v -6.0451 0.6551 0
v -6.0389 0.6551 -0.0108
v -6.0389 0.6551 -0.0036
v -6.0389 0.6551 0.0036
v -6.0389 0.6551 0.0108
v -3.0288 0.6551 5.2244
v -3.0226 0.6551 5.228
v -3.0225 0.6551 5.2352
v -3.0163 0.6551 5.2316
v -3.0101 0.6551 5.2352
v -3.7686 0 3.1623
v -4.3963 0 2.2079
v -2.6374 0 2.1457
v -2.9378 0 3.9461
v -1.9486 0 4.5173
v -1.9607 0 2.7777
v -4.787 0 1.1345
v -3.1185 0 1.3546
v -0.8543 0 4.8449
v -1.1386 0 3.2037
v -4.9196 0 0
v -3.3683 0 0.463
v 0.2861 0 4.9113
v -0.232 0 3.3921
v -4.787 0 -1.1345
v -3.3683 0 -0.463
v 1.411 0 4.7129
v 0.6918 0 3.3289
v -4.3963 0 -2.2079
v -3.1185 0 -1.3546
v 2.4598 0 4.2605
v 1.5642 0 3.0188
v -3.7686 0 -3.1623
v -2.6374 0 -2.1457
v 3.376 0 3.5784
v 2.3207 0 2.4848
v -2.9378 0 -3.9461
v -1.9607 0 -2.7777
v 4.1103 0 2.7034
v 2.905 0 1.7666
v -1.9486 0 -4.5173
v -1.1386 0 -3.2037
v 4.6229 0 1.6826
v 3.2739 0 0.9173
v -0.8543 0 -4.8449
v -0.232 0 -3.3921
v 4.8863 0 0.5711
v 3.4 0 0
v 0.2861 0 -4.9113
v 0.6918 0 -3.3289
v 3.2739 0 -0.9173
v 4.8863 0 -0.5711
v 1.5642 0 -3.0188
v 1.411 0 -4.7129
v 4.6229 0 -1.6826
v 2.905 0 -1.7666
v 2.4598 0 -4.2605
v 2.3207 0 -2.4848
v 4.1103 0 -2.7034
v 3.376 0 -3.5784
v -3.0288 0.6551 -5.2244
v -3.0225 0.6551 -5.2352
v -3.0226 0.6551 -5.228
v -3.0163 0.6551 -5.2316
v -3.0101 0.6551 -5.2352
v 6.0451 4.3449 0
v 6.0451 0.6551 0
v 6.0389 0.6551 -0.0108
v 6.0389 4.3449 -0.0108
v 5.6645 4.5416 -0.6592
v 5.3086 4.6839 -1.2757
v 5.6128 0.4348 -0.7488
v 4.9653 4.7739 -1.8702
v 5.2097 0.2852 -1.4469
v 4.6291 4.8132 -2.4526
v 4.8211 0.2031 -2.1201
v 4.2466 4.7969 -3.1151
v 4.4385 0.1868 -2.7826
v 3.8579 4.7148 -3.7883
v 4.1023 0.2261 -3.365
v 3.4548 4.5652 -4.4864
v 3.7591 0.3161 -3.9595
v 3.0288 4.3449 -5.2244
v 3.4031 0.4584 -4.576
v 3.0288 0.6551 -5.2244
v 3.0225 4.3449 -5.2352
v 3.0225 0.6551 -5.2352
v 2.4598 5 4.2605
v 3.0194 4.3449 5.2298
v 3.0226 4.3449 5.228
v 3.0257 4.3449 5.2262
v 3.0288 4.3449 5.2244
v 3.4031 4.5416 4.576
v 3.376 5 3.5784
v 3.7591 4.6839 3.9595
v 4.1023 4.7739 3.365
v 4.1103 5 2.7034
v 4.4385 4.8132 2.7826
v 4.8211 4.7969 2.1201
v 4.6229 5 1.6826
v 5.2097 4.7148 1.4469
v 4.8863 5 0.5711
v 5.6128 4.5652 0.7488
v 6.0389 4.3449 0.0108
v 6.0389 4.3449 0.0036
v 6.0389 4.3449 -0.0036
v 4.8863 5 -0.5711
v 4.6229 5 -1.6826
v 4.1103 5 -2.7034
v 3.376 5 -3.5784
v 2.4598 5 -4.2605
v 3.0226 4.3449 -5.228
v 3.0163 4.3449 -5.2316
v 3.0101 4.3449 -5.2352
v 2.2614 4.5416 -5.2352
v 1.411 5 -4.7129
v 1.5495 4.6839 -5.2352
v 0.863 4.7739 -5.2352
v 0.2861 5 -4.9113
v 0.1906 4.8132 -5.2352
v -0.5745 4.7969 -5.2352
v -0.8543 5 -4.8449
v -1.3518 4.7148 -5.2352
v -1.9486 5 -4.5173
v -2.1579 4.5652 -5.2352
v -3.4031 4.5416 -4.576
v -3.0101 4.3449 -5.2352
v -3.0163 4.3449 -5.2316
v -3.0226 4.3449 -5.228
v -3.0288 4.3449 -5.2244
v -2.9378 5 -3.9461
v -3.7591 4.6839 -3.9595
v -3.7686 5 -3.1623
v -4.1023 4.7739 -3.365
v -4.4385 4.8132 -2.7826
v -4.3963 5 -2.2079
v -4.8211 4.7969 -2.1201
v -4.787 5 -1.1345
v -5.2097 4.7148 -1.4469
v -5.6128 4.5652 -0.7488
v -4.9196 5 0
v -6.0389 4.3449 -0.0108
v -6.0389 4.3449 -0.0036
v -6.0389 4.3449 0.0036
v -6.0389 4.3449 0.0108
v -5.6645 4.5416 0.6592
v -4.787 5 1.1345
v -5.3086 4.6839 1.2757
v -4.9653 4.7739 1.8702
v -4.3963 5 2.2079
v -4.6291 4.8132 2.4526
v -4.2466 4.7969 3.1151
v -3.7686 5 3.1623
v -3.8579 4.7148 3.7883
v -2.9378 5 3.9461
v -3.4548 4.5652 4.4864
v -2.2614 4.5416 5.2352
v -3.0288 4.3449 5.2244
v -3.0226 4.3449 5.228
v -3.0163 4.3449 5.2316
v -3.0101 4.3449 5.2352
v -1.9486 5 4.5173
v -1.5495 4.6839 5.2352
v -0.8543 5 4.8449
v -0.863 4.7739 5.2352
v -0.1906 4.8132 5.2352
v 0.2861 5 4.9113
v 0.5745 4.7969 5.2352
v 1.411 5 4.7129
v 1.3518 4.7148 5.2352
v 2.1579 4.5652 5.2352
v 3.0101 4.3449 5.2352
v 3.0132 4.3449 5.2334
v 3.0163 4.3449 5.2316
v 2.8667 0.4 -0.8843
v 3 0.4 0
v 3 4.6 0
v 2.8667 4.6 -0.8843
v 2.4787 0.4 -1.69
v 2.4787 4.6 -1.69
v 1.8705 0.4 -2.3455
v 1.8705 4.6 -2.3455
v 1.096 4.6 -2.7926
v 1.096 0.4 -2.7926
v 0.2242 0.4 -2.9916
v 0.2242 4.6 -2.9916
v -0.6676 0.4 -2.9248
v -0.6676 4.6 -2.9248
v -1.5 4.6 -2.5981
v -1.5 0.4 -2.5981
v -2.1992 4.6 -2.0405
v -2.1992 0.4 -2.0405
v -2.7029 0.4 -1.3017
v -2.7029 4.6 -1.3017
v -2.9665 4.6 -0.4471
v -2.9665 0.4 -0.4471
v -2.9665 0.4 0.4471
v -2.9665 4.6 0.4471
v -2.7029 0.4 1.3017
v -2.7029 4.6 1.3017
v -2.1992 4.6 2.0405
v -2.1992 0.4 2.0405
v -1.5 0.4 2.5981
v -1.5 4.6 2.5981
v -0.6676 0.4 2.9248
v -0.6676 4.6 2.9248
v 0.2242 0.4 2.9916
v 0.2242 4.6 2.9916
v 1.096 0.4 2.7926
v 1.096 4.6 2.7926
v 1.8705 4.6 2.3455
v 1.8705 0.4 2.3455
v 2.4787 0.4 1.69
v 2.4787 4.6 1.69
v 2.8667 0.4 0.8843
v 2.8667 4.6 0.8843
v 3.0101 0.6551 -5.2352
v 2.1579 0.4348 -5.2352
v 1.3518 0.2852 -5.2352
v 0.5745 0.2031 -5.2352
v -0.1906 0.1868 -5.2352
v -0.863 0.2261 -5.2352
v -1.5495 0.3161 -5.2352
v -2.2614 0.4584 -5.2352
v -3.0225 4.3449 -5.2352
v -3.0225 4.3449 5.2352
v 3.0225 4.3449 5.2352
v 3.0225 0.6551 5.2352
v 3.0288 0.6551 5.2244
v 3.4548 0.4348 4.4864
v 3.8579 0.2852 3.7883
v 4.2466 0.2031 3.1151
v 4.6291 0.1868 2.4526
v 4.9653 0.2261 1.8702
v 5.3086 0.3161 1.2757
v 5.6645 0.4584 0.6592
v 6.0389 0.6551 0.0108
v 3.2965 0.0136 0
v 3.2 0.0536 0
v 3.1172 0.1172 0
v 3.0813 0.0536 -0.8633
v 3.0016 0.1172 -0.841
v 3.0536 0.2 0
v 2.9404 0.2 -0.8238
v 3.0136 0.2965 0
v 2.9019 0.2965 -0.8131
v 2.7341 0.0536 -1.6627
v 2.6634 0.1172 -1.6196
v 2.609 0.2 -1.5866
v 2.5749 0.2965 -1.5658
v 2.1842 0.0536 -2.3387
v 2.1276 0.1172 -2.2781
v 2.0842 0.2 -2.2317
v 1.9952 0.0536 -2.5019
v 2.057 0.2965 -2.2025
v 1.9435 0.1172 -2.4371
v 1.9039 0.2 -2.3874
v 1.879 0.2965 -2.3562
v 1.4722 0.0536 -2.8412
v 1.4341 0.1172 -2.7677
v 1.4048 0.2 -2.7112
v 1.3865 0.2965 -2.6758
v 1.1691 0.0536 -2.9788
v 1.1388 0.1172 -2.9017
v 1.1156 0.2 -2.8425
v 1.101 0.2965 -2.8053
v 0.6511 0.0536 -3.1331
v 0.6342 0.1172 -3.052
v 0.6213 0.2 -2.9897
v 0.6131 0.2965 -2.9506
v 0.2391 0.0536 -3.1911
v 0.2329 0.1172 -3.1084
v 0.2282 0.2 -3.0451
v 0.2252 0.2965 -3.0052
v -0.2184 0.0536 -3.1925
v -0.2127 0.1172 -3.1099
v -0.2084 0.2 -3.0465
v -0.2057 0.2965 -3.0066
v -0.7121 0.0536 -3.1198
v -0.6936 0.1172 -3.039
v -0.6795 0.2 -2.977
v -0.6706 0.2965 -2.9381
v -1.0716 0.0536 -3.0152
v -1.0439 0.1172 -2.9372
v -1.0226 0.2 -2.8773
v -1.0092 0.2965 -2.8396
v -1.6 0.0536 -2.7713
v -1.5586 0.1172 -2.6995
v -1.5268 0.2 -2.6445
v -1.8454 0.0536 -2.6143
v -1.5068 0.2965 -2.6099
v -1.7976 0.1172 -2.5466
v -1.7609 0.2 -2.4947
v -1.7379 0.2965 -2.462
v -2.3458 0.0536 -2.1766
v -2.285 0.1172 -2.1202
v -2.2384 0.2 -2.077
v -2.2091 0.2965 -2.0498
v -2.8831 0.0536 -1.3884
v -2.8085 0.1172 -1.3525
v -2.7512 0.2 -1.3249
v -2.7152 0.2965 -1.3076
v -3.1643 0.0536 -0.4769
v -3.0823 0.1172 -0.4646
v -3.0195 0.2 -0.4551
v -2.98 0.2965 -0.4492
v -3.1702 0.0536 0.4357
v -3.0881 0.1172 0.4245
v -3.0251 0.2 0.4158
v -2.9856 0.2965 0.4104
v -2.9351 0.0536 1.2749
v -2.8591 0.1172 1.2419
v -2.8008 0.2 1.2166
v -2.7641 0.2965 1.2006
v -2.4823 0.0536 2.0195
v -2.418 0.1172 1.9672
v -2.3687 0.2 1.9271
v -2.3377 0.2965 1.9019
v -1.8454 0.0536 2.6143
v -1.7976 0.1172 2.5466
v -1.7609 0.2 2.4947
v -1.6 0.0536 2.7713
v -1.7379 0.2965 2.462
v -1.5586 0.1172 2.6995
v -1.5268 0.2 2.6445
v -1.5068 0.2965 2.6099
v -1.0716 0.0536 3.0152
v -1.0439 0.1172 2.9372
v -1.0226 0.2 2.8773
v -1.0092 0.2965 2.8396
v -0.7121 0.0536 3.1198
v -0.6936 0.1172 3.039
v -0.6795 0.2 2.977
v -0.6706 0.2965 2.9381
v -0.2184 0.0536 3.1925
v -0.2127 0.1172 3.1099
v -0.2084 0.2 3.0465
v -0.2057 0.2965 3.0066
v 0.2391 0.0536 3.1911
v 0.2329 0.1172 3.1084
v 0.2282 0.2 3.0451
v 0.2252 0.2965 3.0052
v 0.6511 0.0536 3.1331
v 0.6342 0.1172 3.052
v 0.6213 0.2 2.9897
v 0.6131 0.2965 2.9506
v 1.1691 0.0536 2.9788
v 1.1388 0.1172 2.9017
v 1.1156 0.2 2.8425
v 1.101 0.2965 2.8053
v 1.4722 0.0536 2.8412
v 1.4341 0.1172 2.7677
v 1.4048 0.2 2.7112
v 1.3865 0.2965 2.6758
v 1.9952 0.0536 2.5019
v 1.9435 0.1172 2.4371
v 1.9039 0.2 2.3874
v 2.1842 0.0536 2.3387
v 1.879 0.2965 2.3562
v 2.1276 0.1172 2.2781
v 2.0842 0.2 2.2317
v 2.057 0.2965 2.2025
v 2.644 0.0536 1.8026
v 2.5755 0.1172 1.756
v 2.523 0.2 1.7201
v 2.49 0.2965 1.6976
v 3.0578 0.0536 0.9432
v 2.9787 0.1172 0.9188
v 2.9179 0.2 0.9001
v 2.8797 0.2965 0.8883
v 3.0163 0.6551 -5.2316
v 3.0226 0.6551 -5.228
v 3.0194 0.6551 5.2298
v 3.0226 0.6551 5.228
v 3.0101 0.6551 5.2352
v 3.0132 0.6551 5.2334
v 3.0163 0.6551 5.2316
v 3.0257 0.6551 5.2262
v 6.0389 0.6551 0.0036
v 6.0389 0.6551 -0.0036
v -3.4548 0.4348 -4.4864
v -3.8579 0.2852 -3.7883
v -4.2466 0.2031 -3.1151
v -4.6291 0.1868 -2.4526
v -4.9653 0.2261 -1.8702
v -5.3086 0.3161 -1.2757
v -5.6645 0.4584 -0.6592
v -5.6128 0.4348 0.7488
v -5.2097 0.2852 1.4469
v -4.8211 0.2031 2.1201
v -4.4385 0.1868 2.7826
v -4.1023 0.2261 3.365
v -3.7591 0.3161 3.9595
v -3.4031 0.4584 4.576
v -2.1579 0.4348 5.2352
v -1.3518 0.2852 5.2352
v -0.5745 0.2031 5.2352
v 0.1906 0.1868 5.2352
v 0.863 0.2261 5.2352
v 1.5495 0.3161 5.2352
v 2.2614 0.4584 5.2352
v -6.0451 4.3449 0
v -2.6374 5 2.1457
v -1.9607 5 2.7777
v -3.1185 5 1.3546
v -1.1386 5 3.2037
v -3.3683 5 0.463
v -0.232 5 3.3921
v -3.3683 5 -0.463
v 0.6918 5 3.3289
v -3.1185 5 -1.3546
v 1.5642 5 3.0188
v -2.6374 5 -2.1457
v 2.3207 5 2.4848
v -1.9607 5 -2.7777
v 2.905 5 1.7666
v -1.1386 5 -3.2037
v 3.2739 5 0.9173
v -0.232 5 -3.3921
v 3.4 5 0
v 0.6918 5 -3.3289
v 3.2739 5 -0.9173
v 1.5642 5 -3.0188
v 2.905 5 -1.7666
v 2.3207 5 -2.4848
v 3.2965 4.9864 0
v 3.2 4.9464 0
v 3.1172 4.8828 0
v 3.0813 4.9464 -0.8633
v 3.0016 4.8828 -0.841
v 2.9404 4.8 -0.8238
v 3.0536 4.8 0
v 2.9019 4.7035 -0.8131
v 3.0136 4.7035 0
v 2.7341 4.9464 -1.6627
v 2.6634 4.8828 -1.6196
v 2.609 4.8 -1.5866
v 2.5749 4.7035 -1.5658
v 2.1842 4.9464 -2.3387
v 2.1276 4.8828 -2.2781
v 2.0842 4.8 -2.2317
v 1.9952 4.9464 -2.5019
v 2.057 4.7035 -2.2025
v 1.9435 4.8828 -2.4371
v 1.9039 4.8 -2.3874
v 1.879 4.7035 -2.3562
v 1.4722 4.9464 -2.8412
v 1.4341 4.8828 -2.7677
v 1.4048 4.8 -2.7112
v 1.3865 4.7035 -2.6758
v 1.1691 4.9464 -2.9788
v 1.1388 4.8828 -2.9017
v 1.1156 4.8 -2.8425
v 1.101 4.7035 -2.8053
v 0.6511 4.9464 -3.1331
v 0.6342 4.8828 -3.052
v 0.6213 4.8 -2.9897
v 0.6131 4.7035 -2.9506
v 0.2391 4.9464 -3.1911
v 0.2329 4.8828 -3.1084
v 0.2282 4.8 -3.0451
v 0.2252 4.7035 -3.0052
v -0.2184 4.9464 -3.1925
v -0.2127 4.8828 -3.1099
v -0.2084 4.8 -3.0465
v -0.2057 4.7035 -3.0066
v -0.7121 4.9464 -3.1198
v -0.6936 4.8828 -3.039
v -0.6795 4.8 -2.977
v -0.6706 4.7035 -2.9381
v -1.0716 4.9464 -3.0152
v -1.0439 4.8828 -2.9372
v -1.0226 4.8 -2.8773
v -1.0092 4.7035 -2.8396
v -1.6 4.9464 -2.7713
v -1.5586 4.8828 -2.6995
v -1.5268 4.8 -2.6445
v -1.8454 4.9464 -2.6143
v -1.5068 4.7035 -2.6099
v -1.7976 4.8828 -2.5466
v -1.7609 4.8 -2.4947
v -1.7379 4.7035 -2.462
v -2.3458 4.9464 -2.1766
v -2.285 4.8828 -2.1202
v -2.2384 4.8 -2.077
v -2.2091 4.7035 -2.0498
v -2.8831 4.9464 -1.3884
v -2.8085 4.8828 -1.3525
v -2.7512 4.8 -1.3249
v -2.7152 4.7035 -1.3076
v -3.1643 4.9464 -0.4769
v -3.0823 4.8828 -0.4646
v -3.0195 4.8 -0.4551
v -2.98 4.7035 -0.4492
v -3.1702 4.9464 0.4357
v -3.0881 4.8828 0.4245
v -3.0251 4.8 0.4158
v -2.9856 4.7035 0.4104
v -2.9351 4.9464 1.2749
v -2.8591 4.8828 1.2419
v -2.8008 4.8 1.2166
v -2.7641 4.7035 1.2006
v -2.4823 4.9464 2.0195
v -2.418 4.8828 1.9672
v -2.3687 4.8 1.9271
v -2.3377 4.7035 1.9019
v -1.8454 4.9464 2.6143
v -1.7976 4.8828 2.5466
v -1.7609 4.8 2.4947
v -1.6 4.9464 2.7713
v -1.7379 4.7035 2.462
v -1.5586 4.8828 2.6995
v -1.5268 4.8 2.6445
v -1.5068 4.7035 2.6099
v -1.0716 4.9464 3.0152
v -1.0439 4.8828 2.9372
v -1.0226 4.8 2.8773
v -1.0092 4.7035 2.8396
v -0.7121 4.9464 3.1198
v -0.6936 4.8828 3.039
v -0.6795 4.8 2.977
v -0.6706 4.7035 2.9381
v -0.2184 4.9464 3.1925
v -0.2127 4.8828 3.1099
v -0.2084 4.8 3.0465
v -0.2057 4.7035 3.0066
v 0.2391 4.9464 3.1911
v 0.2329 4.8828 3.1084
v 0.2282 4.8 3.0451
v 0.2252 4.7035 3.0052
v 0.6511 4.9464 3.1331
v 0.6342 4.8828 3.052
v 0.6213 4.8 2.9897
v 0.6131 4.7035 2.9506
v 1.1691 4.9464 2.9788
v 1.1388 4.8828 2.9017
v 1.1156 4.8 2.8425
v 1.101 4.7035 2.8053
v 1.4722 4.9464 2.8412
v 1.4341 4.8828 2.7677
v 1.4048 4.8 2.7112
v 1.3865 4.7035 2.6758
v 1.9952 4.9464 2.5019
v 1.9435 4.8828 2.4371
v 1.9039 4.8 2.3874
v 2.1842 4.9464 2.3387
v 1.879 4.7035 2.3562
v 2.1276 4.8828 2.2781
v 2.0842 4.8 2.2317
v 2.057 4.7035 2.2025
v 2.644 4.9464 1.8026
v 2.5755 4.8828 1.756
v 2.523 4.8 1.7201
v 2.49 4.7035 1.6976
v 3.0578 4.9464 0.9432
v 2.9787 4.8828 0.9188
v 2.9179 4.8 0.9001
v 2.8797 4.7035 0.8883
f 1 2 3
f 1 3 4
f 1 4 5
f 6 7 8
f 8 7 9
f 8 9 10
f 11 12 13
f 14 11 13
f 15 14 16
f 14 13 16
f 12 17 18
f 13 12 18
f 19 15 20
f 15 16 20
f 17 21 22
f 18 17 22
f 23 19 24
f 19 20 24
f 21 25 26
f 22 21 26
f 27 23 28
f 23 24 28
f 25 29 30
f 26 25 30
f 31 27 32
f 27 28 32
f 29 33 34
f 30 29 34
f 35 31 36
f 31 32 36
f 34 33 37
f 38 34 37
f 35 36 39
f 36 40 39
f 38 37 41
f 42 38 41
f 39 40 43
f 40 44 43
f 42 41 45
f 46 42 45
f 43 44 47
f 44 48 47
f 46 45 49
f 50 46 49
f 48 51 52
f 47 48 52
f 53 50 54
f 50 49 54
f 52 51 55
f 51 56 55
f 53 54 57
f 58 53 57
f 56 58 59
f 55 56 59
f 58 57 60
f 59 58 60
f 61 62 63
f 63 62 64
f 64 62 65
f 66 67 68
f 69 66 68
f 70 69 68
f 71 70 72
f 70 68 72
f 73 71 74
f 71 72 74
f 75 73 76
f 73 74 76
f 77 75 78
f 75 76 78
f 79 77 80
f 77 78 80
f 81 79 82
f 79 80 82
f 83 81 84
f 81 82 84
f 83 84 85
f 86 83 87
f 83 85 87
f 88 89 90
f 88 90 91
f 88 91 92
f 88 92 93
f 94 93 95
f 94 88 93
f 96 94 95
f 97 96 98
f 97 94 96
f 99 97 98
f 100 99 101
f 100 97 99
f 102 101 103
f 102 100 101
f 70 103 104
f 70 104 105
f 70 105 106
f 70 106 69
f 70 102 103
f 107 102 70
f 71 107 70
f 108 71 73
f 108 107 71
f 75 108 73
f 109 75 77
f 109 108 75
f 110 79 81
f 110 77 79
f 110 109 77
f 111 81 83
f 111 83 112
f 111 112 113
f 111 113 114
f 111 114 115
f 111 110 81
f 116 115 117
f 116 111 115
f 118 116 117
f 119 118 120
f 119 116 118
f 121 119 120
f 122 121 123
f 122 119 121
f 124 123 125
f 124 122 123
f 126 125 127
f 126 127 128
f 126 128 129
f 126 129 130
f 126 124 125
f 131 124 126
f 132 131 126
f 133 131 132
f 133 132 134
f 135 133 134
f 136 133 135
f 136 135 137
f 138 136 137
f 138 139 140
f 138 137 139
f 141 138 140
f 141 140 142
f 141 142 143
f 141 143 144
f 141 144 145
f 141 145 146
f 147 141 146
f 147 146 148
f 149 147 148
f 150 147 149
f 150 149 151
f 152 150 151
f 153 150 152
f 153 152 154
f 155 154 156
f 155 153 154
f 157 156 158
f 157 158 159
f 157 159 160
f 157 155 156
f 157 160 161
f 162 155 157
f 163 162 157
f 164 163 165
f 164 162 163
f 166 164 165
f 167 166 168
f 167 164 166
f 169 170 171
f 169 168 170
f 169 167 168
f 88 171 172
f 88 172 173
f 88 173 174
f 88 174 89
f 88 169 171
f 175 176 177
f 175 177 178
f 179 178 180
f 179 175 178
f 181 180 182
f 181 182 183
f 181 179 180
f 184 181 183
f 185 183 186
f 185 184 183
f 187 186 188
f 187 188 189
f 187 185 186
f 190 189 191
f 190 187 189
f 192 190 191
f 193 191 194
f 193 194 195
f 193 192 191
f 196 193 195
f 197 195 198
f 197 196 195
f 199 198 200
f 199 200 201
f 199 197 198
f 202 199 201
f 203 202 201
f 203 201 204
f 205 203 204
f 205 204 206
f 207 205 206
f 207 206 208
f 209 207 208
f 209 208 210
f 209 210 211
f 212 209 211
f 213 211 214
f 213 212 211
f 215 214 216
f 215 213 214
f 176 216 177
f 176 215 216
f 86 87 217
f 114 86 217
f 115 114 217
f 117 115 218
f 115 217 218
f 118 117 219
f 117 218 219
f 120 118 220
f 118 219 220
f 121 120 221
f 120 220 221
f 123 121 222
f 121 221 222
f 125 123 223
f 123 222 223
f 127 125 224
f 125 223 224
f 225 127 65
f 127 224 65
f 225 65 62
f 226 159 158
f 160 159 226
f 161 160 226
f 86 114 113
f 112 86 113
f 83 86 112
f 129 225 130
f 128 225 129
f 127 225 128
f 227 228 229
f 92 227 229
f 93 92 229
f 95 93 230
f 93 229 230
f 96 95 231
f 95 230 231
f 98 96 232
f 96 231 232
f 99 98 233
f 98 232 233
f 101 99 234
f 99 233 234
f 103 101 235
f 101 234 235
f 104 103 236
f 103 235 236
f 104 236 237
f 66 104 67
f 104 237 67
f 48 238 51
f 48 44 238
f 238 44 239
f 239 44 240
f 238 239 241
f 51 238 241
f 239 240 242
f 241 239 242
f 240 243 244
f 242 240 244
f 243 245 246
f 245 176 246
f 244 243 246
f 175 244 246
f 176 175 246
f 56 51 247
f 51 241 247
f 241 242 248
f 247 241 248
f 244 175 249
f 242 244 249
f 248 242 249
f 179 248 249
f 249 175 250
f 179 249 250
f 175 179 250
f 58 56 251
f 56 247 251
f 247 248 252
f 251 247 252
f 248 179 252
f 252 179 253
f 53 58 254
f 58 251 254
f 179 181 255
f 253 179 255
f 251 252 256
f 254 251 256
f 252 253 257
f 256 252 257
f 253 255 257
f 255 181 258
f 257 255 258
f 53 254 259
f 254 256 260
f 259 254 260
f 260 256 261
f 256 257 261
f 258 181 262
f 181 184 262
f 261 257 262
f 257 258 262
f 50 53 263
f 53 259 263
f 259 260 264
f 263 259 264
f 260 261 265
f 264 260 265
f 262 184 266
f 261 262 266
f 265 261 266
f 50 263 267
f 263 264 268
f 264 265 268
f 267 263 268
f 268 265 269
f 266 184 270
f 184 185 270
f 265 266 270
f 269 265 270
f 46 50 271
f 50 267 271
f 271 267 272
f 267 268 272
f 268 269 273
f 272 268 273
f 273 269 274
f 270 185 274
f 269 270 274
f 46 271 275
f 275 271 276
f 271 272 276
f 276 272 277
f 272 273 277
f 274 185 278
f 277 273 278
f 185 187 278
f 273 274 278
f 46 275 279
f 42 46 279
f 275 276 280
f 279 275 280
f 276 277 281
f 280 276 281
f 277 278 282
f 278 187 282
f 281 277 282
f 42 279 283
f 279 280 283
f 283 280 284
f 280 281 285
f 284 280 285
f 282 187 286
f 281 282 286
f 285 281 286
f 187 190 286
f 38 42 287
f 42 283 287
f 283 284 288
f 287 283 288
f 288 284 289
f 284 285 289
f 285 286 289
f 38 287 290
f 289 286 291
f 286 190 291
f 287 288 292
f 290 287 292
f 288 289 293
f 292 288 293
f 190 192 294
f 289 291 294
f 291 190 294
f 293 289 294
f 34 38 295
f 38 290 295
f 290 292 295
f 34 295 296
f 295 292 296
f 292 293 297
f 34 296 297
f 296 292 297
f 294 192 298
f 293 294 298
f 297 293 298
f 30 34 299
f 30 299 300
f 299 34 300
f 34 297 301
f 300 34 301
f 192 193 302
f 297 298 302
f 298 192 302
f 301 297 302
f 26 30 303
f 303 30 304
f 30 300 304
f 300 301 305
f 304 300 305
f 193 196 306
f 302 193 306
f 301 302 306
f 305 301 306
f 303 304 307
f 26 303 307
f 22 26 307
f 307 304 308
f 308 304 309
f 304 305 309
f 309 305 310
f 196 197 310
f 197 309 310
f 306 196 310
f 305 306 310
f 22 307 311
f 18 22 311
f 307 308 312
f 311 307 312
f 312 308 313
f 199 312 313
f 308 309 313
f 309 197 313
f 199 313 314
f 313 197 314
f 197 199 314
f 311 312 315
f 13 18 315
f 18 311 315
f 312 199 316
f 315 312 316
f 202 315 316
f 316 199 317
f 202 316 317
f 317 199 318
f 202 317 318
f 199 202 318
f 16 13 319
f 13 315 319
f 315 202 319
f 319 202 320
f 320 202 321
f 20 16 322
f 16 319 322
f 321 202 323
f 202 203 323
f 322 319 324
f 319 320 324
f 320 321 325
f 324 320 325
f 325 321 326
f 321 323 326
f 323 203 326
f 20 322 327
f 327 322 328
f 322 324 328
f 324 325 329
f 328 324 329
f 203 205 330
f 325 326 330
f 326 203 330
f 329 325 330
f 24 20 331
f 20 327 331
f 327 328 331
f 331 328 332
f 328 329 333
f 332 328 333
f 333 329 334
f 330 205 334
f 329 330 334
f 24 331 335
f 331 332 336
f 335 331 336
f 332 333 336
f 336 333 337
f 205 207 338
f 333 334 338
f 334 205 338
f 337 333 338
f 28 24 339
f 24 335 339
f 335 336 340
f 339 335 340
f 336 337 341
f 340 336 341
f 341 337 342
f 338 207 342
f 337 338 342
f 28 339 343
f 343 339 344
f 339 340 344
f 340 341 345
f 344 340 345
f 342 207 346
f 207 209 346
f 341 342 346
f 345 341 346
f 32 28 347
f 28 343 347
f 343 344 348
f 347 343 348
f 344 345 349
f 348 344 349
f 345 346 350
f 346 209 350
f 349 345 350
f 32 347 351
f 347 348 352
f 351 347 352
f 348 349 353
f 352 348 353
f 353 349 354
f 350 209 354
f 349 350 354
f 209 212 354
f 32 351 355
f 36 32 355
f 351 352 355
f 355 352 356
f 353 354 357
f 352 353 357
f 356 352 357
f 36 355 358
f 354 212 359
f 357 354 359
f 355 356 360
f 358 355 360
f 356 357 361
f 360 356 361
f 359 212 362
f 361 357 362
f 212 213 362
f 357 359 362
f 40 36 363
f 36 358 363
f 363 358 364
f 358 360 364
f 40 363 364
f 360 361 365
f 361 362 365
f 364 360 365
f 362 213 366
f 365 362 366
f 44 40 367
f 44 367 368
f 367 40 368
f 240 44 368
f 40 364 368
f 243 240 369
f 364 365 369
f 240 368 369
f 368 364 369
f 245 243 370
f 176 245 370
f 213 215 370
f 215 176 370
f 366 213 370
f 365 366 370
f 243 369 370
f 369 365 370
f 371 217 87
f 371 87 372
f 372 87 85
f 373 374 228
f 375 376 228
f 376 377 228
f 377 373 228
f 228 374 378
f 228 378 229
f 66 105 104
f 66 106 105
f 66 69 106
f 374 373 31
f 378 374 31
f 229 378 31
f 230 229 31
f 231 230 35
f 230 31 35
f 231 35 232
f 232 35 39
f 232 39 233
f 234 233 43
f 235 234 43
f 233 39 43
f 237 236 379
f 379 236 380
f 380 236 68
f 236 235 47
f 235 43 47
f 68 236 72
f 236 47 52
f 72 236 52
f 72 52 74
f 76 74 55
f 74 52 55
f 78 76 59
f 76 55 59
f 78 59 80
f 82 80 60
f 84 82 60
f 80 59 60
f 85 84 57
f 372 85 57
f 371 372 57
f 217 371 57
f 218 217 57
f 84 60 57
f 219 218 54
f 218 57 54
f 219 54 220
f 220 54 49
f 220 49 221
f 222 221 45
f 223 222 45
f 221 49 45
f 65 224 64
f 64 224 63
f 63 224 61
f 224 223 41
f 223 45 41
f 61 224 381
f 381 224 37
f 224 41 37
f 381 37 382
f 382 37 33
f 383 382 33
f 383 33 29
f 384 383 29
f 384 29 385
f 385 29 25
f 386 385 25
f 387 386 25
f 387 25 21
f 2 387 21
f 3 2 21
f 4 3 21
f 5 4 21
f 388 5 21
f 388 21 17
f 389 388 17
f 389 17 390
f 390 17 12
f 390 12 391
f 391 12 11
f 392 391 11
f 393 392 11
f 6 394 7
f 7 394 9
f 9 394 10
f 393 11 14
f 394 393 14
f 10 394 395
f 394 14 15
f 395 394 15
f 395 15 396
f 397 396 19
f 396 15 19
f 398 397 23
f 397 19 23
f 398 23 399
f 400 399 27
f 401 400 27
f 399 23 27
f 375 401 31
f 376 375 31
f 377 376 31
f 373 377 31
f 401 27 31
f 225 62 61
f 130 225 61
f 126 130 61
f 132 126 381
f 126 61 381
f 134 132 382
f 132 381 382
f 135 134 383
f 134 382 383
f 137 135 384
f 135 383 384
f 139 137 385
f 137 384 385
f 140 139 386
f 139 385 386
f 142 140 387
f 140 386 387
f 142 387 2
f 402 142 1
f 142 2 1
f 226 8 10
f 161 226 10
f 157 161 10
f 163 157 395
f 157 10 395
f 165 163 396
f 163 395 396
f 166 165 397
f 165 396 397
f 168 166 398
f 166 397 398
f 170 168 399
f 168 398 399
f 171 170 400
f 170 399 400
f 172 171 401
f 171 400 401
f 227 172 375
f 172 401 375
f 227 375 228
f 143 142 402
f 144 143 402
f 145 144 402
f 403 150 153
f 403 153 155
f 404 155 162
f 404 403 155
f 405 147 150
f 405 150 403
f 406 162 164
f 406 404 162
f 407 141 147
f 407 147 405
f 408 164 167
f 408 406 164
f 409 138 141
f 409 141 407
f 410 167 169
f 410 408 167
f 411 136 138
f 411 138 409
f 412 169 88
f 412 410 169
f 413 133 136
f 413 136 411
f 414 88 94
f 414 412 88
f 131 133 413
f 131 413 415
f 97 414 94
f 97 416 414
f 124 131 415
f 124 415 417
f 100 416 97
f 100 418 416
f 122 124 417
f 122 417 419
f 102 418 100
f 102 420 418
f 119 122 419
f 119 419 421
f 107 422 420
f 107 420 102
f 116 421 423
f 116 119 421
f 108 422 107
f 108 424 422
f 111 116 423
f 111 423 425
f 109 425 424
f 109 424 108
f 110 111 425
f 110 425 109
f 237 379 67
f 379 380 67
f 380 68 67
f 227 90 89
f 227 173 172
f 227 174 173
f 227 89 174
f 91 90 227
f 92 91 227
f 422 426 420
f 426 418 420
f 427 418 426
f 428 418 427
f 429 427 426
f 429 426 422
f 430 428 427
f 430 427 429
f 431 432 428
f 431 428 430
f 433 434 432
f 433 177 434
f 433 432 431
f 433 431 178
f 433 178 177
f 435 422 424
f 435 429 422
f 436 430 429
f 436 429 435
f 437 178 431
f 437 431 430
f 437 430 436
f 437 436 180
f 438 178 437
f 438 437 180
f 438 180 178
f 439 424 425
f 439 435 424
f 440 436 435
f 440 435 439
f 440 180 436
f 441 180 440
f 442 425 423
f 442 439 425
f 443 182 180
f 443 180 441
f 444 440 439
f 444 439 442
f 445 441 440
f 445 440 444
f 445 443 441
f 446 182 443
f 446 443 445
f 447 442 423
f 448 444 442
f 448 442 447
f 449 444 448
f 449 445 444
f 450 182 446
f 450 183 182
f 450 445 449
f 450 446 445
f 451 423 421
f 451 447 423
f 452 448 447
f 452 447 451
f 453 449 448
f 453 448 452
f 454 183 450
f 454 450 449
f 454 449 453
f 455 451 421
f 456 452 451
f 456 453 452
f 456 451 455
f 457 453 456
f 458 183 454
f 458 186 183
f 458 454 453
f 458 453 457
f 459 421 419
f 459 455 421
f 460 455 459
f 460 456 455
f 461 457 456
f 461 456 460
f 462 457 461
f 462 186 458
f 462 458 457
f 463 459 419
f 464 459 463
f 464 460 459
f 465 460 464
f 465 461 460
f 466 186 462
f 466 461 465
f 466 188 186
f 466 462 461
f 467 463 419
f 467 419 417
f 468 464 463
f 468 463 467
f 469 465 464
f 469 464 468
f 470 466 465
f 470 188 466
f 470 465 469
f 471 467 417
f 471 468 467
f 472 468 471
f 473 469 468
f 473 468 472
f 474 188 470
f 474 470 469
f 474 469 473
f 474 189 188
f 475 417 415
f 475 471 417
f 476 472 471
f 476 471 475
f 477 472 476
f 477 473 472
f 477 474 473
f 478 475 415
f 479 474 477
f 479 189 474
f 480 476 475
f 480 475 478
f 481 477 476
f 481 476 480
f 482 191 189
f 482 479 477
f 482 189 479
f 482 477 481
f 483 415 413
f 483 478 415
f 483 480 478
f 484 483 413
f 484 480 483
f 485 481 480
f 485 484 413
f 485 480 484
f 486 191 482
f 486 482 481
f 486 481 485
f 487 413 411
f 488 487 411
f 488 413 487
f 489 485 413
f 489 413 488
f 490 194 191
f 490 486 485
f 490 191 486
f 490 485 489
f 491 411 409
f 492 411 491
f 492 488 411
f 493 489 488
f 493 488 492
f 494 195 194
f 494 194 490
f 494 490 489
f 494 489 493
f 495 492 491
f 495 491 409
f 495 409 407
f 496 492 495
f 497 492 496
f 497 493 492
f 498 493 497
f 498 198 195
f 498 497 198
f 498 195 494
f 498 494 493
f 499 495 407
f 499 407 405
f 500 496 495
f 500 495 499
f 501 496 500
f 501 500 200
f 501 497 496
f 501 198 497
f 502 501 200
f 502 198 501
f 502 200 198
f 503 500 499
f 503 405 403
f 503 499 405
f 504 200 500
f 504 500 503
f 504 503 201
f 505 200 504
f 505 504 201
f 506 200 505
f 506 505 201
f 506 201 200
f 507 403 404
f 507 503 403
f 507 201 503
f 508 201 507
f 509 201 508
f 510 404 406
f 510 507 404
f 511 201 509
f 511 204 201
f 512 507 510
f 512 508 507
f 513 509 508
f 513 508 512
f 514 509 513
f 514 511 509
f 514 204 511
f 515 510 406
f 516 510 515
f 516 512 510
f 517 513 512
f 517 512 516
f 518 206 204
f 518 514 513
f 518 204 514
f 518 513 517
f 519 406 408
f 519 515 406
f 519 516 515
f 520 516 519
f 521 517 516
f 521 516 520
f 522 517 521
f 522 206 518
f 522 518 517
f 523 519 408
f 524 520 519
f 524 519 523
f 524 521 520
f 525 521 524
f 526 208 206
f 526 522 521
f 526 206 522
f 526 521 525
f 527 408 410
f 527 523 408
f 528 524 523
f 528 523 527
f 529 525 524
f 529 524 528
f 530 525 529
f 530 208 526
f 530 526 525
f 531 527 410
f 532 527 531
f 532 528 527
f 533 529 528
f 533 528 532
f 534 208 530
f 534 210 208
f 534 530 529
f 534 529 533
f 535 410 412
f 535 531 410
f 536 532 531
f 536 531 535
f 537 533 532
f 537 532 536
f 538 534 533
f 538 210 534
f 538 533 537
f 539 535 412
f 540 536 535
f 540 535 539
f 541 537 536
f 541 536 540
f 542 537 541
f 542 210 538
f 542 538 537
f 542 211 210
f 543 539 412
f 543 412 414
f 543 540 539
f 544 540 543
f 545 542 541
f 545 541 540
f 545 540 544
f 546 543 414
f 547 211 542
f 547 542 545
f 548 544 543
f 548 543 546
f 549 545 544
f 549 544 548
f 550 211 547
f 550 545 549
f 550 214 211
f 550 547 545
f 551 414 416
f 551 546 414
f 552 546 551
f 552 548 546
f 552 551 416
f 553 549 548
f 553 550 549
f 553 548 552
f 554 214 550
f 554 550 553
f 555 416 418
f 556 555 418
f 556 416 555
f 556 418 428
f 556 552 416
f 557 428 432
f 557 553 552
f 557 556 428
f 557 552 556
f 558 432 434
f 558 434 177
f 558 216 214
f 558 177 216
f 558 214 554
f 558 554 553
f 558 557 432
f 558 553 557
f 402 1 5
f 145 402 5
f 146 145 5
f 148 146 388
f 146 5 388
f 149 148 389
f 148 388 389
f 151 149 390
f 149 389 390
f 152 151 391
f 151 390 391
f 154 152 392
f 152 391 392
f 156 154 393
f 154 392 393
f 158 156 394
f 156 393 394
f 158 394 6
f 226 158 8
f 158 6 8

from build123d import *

# Parameters (mm, degrees)
SKETCH1_R           = 3
BOSS_EXTRUDE1_DEPTH = 5
FILLET1_R           = 0.4


with BuildPart() as part:
    # Sketch1 → Boss-Extrude1 (new body)
    with BuildSketch(Plane(origin=(0, 0, 0), x_dir=(1, 0, 0), z_dir=(0, 1, 0))):
        Polygon((6.0450921, 0), (3.02254605, 5.235203327), (-3.02254605, 5.235203327), (-6.0450921, 0), (-3.02254605, -5.235203327), (3.02254605, -5.235203327), align=None)
        Circle(SKETCH1_R, mode=Mode.SUBTRACT)
    extrude(amount=BOSS_EXTRUDE1_DEPTH)

    # Sketch2 → Cut-Revolve1 (revolve, cut)
    with BuildSketch(Plane(origin=(0, 0, 0), x_dir=(-0.5, 0, -0.866025404), z_dir=(0.866025404, 0, -0.5))):
        Polygon((-6.389496142, 4.34485452), (-6.038887138, 4.34485452), (-4.919612053, 5), (-6.274952166, 5.0992455), align=None)
    cut_revolve1 = revolve(axis=Axis((0, 0, 0), (0, 1, 0)), mode=Mode.SUBTRACT)

    # Mirror1: Cut-Revolve1 across plane
    add(cut_revolve1.mirror(Plane.ZX.offset(2.5)), mode=Mode.SUBTRACT)

    # Fillet1
    fillet1_edges = [part.edges().sort_by_distance(p)[0] for p in [
        (-3, 0, 0),
        (-3, 5, 0),
    ]]
    fillet(fillet1_edges, radius=FILLET1_R)


solid = part.part
